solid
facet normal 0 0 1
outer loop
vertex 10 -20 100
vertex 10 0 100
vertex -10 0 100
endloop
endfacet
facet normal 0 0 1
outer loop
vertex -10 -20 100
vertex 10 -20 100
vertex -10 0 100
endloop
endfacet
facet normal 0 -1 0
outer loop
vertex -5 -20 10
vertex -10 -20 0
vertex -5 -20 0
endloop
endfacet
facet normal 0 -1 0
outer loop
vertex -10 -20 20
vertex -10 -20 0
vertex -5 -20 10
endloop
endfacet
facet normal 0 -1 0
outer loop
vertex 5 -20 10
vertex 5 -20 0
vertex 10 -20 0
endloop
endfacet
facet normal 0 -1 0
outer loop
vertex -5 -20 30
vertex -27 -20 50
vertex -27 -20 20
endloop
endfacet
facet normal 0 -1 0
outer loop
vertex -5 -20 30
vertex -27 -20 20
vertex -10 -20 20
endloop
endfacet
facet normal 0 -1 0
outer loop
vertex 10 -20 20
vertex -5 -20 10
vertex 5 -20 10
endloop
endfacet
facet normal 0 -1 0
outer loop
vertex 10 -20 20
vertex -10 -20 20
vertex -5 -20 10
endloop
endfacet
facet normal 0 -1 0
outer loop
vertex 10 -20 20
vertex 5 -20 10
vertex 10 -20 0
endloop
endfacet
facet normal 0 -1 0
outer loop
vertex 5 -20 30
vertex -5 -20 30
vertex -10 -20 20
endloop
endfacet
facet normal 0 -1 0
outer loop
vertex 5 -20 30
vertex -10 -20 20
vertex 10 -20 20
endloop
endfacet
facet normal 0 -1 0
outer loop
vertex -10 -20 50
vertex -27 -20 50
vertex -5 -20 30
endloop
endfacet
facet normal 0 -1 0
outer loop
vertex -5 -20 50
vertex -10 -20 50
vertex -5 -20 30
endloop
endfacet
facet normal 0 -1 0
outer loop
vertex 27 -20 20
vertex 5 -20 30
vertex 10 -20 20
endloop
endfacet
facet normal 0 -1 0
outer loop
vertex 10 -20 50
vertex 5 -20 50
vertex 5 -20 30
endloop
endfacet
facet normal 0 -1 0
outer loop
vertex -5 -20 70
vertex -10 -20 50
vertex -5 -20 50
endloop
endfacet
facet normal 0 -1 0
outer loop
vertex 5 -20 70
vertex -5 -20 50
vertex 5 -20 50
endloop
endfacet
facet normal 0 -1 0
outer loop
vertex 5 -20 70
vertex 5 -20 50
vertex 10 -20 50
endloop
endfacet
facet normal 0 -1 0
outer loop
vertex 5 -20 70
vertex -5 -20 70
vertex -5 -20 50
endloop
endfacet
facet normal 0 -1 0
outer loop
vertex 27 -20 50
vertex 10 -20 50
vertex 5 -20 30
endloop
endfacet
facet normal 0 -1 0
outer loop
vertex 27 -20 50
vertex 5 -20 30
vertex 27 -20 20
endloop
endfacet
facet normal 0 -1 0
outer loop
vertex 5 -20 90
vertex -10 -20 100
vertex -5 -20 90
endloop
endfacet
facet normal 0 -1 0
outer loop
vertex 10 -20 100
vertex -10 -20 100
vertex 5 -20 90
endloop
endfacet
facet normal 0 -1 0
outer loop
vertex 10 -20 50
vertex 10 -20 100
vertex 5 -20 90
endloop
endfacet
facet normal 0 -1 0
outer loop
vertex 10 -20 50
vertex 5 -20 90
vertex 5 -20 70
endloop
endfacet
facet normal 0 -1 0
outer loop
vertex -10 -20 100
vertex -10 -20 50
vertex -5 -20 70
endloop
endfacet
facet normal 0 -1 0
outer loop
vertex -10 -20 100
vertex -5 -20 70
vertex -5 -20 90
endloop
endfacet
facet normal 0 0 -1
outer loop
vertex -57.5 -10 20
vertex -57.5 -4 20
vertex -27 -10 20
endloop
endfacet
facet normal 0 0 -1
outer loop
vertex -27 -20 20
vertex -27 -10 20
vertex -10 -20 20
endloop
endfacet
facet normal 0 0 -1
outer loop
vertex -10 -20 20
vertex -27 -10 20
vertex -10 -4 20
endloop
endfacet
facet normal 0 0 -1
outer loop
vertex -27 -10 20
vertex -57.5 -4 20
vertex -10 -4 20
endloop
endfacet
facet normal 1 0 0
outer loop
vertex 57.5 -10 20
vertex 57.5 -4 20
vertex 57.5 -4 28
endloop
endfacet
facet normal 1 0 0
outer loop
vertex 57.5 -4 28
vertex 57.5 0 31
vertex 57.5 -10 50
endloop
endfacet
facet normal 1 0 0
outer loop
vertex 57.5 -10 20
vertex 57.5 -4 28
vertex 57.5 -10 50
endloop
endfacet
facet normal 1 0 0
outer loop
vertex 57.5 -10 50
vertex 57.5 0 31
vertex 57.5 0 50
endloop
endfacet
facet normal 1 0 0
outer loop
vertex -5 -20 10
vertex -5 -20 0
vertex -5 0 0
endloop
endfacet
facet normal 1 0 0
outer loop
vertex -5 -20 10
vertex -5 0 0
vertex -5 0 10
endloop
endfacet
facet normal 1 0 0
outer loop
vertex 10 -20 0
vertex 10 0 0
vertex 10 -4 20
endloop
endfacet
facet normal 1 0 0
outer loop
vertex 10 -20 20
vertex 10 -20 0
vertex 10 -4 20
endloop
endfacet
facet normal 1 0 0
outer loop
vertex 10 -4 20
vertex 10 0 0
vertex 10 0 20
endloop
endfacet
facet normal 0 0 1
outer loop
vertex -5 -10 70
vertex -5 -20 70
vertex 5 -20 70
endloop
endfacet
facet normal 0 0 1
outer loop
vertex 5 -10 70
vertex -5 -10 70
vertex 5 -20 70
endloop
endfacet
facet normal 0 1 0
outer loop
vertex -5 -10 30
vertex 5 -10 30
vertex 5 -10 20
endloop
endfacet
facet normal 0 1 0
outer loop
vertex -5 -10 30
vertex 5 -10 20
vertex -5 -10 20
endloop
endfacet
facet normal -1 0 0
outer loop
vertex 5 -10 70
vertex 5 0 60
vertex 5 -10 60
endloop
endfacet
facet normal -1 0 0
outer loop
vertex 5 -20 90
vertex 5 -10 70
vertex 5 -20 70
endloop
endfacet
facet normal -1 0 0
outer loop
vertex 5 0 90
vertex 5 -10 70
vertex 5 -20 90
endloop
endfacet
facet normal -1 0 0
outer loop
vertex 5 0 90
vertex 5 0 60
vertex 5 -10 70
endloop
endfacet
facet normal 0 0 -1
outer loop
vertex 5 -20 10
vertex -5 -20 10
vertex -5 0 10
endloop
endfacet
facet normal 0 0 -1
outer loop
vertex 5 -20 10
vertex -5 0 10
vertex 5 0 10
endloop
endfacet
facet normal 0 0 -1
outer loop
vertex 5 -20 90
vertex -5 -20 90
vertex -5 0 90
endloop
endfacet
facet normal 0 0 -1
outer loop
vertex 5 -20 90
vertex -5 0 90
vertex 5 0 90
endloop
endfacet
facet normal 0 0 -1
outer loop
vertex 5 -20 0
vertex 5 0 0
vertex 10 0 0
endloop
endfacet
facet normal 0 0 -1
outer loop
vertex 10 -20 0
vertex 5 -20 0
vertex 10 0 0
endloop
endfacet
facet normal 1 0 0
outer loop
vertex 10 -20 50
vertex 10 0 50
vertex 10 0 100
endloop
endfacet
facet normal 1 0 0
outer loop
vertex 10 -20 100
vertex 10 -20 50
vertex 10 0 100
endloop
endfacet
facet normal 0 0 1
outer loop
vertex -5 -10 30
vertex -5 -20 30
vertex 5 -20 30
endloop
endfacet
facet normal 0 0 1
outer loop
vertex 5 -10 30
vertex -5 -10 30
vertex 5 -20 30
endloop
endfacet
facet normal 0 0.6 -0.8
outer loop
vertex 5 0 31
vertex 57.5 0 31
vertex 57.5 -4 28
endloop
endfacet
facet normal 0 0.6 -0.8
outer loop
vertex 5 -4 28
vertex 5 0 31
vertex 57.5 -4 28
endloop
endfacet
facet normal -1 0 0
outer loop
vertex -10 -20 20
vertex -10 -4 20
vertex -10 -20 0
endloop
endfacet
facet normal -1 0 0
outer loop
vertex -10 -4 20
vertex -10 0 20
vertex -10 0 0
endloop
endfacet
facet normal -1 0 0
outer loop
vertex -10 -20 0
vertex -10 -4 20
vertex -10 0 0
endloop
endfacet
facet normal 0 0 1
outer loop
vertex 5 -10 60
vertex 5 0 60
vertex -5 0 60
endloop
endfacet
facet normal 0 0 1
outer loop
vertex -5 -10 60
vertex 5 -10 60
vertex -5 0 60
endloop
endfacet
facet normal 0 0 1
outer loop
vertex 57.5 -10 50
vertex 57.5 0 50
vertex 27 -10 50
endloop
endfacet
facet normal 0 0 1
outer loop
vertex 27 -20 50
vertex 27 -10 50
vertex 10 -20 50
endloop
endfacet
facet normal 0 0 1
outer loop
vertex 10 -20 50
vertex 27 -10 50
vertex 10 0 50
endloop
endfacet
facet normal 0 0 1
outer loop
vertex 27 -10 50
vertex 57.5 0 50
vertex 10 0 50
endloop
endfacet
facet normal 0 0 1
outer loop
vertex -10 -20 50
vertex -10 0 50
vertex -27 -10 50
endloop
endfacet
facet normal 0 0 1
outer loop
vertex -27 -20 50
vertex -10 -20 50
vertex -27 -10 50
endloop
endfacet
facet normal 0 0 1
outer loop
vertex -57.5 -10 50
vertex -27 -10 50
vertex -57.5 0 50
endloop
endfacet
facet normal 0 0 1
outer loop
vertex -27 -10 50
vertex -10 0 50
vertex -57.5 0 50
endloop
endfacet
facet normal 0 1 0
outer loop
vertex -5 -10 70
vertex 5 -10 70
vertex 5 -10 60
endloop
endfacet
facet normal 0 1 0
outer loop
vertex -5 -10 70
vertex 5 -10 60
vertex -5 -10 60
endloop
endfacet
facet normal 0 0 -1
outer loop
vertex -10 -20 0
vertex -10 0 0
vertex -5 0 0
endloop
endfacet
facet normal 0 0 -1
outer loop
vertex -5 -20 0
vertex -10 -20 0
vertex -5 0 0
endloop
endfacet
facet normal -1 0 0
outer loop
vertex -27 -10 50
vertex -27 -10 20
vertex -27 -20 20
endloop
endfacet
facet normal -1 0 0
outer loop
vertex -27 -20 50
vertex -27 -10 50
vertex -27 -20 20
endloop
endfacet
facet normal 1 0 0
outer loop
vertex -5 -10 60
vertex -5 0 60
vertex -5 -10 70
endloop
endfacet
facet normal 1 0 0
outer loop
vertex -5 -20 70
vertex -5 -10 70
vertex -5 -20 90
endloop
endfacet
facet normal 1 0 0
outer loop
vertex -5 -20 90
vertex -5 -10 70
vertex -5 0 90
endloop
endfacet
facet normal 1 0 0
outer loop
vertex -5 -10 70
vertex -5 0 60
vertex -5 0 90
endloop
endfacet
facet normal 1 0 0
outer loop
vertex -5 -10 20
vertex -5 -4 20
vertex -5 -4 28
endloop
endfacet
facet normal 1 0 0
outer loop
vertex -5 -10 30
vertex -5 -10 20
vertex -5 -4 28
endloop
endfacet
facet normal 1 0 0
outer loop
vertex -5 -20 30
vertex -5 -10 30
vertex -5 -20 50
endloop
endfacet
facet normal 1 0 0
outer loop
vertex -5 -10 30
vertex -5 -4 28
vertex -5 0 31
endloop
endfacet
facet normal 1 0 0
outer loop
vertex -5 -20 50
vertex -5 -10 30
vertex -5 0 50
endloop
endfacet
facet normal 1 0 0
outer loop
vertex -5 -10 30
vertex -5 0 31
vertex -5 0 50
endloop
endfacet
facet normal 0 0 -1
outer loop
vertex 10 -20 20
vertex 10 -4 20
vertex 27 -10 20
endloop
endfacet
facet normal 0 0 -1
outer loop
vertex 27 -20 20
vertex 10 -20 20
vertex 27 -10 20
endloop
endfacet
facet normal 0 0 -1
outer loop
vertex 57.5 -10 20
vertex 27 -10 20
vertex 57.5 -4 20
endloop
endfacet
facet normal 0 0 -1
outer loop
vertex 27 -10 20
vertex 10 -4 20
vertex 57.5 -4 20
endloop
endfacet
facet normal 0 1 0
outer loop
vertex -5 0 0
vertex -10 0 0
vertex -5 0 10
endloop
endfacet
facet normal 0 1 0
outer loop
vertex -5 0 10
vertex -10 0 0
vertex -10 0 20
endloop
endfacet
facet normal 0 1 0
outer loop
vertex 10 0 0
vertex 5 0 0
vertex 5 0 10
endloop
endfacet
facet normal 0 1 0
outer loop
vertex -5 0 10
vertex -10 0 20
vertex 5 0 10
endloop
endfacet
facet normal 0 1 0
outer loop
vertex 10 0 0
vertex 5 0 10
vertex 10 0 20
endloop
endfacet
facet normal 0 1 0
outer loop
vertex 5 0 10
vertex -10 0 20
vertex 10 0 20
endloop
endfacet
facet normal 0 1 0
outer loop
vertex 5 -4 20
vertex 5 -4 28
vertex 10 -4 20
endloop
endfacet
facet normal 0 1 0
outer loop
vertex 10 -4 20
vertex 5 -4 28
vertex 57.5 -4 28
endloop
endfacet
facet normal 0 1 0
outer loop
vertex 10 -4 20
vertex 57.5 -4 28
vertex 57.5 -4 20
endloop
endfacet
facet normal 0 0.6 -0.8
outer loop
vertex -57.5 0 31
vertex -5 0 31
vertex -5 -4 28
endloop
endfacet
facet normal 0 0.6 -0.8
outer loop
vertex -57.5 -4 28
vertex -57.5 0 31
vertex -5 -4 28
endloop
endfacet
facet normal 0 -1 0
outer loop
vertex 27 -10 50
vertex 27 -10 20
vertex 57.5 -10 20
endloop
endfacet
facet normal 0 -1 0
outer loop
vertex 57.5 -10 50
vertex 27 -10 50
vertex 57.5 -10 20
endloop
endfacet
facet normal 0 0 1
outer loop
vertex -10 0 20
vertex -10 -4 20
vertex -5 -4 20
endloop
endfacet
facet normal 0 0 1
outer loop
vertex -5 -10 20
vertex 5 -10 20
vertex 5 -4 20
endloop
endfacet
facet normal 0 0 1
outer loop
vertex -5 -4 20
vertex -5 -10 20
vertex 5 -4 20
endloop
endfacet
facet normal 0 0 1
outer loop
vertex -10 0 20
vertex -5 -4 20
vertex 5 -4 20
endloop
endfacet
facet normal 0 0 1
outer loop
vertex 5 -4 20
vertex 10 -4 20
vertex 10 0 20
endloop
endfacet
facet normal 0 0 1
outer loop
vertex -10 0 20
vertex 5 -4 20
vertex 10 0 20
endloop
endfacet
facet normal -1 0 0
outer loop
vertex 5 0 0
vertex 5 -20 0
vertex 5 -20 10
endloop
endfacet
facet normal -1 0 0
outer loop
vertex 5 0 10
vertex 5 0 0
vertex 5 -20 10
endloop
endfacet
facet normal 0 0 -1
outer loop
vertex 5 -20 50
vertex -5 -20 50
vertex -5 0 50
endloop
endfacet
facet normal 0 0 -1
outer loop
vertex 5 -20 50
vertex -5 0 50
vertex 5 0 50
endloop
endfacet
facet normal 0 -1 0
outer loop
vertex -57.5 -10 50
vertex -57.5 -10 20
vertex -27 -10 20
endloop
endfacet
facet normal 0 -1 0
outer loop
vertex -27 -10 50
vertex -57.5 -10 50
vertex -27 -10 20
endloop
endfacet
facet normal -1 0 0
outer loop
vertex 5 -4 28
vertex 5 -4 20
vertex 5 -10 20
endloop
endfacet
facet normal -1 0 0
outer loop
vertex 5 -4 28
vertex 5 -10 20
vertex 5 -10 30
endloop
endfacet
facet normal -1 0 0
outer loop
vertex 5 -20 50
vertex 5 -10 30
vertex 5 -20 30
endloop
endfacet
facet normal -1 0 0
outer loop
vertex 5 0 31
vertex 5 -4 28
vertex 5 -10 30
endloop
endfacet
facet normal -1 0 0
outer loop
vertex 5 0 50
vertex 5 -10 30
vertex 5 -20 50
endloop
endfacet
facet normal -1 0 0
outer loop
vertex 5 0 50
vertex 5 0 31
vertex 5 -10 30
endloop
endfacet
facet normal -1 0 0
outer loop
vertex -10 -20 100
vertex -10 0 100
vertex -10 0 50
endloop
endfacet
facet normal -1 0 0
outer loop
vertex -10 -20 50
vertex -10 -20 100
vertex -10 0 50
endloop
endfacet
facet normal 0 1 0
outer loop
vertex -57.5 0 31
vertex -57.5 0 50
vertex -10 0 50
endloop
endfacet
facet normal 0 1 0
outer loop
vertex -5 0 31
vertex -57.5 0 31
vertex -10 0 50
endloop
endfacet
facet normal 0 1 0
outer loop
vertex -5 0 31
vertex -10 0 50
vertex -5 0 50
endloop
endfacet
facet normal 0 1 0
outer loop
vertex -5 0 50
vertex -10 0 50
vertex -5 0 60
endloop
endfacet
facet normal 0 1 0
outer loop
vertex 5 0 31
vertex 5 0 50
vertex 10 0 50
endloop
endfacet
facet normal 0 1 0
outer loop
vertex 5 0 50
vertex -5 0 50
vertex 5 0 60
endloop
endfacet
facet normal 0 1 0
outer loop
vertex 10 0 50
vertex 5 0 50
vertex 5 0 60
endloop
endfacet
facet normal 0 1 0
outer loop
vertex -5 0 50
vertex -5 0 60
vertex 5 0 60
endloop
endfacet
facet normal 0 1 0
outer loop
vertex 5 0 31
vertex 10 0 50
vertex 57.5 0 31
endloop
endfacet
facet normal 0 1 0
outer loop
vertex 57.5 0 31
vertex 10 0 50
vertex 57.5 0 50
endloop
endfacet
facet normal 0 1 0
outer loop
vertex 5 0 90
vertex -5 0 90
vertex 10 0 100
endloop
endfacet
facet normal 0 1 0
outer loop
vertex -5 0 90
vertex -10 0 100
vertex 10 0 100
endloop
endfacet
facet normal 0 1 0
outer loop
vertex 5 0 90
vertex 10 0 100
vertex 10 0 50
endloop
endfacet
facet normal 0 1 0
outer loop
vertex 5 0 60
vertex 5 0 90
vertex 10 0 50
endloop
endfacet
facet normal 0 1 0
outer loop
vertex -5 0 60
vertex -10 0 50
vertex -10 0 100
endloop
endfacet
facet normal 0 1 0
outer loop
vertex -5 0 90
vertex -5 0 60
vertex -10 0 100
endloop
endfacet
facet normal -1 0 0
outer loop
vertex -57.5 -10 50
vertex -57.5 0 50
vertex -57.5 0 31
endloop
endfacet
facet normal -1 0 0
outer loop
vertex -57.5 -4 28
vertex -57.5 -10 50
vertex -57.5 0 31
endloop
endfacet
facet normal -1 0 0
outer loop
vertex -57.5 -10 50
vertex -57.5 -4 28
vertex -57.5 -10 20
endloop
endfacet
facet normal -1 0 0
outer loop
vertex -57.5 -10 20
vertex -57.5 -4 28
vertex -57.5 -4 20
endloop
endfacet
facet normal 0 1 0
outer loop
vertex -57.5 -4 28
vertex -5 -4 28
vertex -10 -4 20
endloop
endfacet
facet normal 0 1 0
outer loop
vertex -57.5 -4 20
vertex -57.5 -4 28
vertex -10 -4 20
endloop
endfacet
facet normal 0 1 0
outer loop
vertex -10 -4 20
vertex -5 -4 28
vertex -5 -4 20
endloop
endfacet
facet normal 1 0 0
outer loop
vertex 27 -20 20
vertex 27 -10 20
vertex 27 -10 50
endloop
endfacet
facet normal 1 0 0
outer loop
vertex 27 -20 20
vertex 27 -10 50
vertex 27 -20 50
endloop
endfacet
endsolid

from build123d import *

# Parameters (mm, degrees)
F1_DEPTH  = 20
F2_W      = 30.5
F2_H      = 10
F3_DEPTH  = 30
F4_W      = 30.5
F4_H      = 10
F5_DEPTH  = 30
F7_DEPTH  = 47.5
F8_W      = 10
F8_H      = 20
F8_H_2    = 10
F9_DEPTH  = 20
F10_W     = 10
F10_H     = 10
F11_DEPTH = 10
F13_DEPTH = 150


with BuildPart() as f1:
    # F0 (on Front) → F1 (new body)
    with BuildSketch(Plane.XZ):
        Polygon((-10, 0), (0, 0), (0, 100), (-10, 100), (-10, 50), (-57.5, 50), (-57.5, 20), (-10, 20), align=None)
        Polygon((0, 100), (0, 0), (10, 0), (10, 20), (57.5, 20), (57.5, 50), (10, 50), (10, 100), align=None)
    extrude(amount=F1_DEPTH)

    # F2 (on face) → F3 (cut, through all)
    with BuildSketch(Plane(origin=(0, 0, 20), x_dir=(1, 0, 0), z_dir=(0, 0, -1))):
        with Locations((-42.25, 15)):
            Rectangle(F2_W, F2_H)
    extrude(amount=-F3_DEPTH, mode=Mode.SUBTRACT)

    # F4 (on face) → F5 (cut, through all)
    with BuildSketch(Plane(origin=(0, 0, 20), x_dir=(1, 0, 0), z_dir=(0, 0, -1))):
        with Locations((42.25, 15)):
            Rectangle(F4_W, F4_H)
    extrude(amount=-F5_DEPTH, mode=Mode.SUBTRACT)

    # F6 (on face) → F7 (cut, through all)
    with BuildSketch(Plane(origin=(-57.5, 0, 0), x_dir=(0, -1, 0), z_dir=(-1, 0, 0))):
        Polygon((0, 28), (0, 20), (4, 20), (4, 28), (0, 31), align=None)
    extrude(amount=-F7_DEPTH, mode=Mode.SUBTRACT)

    # F8 (on face) → F9 (cut, through all)
    with BuildSketch(Plane.XZ.offset(20)):
        with Locations((0, 80)):
            Rectangle(F8_W, F8_H)
        with Locations((0, 40)):
            Rectangle(F8_W, F8_H)
        with Locations((0, 5)):
            Rectangle(F8_W, F8_H_2)
    extrude(amount=-F9_DEPTH, mode=Mode.SUBTRACT)

    # F10 (on face) → F11 (cut)
    with BuildSketch(Plane(origin=(0, 0, 0), x_dir=(-1, 0, 0), z_dir=(0, 1, 0))):
        with Locations((0, 65)):
            Rectangle(F10_W, F10_H)
        with Locations((0, 25)):
            Rectangle(F10_W, F10_H)
    extrude(amount=-F11_DEPTH, mode=Mode.SUBTRACT)

    # F12 (on face) → F13 (cut)
    with BuildSketch(Plane.YZ.offset(57.5)):
        Polygon((-4, 20), (0, 20), (0, 28), (0, 31), (-4, 28), align=None)
    extrude(amount=-F13_DEPTH, mode=Mode.SUBTRACT)


solid = f1.part
